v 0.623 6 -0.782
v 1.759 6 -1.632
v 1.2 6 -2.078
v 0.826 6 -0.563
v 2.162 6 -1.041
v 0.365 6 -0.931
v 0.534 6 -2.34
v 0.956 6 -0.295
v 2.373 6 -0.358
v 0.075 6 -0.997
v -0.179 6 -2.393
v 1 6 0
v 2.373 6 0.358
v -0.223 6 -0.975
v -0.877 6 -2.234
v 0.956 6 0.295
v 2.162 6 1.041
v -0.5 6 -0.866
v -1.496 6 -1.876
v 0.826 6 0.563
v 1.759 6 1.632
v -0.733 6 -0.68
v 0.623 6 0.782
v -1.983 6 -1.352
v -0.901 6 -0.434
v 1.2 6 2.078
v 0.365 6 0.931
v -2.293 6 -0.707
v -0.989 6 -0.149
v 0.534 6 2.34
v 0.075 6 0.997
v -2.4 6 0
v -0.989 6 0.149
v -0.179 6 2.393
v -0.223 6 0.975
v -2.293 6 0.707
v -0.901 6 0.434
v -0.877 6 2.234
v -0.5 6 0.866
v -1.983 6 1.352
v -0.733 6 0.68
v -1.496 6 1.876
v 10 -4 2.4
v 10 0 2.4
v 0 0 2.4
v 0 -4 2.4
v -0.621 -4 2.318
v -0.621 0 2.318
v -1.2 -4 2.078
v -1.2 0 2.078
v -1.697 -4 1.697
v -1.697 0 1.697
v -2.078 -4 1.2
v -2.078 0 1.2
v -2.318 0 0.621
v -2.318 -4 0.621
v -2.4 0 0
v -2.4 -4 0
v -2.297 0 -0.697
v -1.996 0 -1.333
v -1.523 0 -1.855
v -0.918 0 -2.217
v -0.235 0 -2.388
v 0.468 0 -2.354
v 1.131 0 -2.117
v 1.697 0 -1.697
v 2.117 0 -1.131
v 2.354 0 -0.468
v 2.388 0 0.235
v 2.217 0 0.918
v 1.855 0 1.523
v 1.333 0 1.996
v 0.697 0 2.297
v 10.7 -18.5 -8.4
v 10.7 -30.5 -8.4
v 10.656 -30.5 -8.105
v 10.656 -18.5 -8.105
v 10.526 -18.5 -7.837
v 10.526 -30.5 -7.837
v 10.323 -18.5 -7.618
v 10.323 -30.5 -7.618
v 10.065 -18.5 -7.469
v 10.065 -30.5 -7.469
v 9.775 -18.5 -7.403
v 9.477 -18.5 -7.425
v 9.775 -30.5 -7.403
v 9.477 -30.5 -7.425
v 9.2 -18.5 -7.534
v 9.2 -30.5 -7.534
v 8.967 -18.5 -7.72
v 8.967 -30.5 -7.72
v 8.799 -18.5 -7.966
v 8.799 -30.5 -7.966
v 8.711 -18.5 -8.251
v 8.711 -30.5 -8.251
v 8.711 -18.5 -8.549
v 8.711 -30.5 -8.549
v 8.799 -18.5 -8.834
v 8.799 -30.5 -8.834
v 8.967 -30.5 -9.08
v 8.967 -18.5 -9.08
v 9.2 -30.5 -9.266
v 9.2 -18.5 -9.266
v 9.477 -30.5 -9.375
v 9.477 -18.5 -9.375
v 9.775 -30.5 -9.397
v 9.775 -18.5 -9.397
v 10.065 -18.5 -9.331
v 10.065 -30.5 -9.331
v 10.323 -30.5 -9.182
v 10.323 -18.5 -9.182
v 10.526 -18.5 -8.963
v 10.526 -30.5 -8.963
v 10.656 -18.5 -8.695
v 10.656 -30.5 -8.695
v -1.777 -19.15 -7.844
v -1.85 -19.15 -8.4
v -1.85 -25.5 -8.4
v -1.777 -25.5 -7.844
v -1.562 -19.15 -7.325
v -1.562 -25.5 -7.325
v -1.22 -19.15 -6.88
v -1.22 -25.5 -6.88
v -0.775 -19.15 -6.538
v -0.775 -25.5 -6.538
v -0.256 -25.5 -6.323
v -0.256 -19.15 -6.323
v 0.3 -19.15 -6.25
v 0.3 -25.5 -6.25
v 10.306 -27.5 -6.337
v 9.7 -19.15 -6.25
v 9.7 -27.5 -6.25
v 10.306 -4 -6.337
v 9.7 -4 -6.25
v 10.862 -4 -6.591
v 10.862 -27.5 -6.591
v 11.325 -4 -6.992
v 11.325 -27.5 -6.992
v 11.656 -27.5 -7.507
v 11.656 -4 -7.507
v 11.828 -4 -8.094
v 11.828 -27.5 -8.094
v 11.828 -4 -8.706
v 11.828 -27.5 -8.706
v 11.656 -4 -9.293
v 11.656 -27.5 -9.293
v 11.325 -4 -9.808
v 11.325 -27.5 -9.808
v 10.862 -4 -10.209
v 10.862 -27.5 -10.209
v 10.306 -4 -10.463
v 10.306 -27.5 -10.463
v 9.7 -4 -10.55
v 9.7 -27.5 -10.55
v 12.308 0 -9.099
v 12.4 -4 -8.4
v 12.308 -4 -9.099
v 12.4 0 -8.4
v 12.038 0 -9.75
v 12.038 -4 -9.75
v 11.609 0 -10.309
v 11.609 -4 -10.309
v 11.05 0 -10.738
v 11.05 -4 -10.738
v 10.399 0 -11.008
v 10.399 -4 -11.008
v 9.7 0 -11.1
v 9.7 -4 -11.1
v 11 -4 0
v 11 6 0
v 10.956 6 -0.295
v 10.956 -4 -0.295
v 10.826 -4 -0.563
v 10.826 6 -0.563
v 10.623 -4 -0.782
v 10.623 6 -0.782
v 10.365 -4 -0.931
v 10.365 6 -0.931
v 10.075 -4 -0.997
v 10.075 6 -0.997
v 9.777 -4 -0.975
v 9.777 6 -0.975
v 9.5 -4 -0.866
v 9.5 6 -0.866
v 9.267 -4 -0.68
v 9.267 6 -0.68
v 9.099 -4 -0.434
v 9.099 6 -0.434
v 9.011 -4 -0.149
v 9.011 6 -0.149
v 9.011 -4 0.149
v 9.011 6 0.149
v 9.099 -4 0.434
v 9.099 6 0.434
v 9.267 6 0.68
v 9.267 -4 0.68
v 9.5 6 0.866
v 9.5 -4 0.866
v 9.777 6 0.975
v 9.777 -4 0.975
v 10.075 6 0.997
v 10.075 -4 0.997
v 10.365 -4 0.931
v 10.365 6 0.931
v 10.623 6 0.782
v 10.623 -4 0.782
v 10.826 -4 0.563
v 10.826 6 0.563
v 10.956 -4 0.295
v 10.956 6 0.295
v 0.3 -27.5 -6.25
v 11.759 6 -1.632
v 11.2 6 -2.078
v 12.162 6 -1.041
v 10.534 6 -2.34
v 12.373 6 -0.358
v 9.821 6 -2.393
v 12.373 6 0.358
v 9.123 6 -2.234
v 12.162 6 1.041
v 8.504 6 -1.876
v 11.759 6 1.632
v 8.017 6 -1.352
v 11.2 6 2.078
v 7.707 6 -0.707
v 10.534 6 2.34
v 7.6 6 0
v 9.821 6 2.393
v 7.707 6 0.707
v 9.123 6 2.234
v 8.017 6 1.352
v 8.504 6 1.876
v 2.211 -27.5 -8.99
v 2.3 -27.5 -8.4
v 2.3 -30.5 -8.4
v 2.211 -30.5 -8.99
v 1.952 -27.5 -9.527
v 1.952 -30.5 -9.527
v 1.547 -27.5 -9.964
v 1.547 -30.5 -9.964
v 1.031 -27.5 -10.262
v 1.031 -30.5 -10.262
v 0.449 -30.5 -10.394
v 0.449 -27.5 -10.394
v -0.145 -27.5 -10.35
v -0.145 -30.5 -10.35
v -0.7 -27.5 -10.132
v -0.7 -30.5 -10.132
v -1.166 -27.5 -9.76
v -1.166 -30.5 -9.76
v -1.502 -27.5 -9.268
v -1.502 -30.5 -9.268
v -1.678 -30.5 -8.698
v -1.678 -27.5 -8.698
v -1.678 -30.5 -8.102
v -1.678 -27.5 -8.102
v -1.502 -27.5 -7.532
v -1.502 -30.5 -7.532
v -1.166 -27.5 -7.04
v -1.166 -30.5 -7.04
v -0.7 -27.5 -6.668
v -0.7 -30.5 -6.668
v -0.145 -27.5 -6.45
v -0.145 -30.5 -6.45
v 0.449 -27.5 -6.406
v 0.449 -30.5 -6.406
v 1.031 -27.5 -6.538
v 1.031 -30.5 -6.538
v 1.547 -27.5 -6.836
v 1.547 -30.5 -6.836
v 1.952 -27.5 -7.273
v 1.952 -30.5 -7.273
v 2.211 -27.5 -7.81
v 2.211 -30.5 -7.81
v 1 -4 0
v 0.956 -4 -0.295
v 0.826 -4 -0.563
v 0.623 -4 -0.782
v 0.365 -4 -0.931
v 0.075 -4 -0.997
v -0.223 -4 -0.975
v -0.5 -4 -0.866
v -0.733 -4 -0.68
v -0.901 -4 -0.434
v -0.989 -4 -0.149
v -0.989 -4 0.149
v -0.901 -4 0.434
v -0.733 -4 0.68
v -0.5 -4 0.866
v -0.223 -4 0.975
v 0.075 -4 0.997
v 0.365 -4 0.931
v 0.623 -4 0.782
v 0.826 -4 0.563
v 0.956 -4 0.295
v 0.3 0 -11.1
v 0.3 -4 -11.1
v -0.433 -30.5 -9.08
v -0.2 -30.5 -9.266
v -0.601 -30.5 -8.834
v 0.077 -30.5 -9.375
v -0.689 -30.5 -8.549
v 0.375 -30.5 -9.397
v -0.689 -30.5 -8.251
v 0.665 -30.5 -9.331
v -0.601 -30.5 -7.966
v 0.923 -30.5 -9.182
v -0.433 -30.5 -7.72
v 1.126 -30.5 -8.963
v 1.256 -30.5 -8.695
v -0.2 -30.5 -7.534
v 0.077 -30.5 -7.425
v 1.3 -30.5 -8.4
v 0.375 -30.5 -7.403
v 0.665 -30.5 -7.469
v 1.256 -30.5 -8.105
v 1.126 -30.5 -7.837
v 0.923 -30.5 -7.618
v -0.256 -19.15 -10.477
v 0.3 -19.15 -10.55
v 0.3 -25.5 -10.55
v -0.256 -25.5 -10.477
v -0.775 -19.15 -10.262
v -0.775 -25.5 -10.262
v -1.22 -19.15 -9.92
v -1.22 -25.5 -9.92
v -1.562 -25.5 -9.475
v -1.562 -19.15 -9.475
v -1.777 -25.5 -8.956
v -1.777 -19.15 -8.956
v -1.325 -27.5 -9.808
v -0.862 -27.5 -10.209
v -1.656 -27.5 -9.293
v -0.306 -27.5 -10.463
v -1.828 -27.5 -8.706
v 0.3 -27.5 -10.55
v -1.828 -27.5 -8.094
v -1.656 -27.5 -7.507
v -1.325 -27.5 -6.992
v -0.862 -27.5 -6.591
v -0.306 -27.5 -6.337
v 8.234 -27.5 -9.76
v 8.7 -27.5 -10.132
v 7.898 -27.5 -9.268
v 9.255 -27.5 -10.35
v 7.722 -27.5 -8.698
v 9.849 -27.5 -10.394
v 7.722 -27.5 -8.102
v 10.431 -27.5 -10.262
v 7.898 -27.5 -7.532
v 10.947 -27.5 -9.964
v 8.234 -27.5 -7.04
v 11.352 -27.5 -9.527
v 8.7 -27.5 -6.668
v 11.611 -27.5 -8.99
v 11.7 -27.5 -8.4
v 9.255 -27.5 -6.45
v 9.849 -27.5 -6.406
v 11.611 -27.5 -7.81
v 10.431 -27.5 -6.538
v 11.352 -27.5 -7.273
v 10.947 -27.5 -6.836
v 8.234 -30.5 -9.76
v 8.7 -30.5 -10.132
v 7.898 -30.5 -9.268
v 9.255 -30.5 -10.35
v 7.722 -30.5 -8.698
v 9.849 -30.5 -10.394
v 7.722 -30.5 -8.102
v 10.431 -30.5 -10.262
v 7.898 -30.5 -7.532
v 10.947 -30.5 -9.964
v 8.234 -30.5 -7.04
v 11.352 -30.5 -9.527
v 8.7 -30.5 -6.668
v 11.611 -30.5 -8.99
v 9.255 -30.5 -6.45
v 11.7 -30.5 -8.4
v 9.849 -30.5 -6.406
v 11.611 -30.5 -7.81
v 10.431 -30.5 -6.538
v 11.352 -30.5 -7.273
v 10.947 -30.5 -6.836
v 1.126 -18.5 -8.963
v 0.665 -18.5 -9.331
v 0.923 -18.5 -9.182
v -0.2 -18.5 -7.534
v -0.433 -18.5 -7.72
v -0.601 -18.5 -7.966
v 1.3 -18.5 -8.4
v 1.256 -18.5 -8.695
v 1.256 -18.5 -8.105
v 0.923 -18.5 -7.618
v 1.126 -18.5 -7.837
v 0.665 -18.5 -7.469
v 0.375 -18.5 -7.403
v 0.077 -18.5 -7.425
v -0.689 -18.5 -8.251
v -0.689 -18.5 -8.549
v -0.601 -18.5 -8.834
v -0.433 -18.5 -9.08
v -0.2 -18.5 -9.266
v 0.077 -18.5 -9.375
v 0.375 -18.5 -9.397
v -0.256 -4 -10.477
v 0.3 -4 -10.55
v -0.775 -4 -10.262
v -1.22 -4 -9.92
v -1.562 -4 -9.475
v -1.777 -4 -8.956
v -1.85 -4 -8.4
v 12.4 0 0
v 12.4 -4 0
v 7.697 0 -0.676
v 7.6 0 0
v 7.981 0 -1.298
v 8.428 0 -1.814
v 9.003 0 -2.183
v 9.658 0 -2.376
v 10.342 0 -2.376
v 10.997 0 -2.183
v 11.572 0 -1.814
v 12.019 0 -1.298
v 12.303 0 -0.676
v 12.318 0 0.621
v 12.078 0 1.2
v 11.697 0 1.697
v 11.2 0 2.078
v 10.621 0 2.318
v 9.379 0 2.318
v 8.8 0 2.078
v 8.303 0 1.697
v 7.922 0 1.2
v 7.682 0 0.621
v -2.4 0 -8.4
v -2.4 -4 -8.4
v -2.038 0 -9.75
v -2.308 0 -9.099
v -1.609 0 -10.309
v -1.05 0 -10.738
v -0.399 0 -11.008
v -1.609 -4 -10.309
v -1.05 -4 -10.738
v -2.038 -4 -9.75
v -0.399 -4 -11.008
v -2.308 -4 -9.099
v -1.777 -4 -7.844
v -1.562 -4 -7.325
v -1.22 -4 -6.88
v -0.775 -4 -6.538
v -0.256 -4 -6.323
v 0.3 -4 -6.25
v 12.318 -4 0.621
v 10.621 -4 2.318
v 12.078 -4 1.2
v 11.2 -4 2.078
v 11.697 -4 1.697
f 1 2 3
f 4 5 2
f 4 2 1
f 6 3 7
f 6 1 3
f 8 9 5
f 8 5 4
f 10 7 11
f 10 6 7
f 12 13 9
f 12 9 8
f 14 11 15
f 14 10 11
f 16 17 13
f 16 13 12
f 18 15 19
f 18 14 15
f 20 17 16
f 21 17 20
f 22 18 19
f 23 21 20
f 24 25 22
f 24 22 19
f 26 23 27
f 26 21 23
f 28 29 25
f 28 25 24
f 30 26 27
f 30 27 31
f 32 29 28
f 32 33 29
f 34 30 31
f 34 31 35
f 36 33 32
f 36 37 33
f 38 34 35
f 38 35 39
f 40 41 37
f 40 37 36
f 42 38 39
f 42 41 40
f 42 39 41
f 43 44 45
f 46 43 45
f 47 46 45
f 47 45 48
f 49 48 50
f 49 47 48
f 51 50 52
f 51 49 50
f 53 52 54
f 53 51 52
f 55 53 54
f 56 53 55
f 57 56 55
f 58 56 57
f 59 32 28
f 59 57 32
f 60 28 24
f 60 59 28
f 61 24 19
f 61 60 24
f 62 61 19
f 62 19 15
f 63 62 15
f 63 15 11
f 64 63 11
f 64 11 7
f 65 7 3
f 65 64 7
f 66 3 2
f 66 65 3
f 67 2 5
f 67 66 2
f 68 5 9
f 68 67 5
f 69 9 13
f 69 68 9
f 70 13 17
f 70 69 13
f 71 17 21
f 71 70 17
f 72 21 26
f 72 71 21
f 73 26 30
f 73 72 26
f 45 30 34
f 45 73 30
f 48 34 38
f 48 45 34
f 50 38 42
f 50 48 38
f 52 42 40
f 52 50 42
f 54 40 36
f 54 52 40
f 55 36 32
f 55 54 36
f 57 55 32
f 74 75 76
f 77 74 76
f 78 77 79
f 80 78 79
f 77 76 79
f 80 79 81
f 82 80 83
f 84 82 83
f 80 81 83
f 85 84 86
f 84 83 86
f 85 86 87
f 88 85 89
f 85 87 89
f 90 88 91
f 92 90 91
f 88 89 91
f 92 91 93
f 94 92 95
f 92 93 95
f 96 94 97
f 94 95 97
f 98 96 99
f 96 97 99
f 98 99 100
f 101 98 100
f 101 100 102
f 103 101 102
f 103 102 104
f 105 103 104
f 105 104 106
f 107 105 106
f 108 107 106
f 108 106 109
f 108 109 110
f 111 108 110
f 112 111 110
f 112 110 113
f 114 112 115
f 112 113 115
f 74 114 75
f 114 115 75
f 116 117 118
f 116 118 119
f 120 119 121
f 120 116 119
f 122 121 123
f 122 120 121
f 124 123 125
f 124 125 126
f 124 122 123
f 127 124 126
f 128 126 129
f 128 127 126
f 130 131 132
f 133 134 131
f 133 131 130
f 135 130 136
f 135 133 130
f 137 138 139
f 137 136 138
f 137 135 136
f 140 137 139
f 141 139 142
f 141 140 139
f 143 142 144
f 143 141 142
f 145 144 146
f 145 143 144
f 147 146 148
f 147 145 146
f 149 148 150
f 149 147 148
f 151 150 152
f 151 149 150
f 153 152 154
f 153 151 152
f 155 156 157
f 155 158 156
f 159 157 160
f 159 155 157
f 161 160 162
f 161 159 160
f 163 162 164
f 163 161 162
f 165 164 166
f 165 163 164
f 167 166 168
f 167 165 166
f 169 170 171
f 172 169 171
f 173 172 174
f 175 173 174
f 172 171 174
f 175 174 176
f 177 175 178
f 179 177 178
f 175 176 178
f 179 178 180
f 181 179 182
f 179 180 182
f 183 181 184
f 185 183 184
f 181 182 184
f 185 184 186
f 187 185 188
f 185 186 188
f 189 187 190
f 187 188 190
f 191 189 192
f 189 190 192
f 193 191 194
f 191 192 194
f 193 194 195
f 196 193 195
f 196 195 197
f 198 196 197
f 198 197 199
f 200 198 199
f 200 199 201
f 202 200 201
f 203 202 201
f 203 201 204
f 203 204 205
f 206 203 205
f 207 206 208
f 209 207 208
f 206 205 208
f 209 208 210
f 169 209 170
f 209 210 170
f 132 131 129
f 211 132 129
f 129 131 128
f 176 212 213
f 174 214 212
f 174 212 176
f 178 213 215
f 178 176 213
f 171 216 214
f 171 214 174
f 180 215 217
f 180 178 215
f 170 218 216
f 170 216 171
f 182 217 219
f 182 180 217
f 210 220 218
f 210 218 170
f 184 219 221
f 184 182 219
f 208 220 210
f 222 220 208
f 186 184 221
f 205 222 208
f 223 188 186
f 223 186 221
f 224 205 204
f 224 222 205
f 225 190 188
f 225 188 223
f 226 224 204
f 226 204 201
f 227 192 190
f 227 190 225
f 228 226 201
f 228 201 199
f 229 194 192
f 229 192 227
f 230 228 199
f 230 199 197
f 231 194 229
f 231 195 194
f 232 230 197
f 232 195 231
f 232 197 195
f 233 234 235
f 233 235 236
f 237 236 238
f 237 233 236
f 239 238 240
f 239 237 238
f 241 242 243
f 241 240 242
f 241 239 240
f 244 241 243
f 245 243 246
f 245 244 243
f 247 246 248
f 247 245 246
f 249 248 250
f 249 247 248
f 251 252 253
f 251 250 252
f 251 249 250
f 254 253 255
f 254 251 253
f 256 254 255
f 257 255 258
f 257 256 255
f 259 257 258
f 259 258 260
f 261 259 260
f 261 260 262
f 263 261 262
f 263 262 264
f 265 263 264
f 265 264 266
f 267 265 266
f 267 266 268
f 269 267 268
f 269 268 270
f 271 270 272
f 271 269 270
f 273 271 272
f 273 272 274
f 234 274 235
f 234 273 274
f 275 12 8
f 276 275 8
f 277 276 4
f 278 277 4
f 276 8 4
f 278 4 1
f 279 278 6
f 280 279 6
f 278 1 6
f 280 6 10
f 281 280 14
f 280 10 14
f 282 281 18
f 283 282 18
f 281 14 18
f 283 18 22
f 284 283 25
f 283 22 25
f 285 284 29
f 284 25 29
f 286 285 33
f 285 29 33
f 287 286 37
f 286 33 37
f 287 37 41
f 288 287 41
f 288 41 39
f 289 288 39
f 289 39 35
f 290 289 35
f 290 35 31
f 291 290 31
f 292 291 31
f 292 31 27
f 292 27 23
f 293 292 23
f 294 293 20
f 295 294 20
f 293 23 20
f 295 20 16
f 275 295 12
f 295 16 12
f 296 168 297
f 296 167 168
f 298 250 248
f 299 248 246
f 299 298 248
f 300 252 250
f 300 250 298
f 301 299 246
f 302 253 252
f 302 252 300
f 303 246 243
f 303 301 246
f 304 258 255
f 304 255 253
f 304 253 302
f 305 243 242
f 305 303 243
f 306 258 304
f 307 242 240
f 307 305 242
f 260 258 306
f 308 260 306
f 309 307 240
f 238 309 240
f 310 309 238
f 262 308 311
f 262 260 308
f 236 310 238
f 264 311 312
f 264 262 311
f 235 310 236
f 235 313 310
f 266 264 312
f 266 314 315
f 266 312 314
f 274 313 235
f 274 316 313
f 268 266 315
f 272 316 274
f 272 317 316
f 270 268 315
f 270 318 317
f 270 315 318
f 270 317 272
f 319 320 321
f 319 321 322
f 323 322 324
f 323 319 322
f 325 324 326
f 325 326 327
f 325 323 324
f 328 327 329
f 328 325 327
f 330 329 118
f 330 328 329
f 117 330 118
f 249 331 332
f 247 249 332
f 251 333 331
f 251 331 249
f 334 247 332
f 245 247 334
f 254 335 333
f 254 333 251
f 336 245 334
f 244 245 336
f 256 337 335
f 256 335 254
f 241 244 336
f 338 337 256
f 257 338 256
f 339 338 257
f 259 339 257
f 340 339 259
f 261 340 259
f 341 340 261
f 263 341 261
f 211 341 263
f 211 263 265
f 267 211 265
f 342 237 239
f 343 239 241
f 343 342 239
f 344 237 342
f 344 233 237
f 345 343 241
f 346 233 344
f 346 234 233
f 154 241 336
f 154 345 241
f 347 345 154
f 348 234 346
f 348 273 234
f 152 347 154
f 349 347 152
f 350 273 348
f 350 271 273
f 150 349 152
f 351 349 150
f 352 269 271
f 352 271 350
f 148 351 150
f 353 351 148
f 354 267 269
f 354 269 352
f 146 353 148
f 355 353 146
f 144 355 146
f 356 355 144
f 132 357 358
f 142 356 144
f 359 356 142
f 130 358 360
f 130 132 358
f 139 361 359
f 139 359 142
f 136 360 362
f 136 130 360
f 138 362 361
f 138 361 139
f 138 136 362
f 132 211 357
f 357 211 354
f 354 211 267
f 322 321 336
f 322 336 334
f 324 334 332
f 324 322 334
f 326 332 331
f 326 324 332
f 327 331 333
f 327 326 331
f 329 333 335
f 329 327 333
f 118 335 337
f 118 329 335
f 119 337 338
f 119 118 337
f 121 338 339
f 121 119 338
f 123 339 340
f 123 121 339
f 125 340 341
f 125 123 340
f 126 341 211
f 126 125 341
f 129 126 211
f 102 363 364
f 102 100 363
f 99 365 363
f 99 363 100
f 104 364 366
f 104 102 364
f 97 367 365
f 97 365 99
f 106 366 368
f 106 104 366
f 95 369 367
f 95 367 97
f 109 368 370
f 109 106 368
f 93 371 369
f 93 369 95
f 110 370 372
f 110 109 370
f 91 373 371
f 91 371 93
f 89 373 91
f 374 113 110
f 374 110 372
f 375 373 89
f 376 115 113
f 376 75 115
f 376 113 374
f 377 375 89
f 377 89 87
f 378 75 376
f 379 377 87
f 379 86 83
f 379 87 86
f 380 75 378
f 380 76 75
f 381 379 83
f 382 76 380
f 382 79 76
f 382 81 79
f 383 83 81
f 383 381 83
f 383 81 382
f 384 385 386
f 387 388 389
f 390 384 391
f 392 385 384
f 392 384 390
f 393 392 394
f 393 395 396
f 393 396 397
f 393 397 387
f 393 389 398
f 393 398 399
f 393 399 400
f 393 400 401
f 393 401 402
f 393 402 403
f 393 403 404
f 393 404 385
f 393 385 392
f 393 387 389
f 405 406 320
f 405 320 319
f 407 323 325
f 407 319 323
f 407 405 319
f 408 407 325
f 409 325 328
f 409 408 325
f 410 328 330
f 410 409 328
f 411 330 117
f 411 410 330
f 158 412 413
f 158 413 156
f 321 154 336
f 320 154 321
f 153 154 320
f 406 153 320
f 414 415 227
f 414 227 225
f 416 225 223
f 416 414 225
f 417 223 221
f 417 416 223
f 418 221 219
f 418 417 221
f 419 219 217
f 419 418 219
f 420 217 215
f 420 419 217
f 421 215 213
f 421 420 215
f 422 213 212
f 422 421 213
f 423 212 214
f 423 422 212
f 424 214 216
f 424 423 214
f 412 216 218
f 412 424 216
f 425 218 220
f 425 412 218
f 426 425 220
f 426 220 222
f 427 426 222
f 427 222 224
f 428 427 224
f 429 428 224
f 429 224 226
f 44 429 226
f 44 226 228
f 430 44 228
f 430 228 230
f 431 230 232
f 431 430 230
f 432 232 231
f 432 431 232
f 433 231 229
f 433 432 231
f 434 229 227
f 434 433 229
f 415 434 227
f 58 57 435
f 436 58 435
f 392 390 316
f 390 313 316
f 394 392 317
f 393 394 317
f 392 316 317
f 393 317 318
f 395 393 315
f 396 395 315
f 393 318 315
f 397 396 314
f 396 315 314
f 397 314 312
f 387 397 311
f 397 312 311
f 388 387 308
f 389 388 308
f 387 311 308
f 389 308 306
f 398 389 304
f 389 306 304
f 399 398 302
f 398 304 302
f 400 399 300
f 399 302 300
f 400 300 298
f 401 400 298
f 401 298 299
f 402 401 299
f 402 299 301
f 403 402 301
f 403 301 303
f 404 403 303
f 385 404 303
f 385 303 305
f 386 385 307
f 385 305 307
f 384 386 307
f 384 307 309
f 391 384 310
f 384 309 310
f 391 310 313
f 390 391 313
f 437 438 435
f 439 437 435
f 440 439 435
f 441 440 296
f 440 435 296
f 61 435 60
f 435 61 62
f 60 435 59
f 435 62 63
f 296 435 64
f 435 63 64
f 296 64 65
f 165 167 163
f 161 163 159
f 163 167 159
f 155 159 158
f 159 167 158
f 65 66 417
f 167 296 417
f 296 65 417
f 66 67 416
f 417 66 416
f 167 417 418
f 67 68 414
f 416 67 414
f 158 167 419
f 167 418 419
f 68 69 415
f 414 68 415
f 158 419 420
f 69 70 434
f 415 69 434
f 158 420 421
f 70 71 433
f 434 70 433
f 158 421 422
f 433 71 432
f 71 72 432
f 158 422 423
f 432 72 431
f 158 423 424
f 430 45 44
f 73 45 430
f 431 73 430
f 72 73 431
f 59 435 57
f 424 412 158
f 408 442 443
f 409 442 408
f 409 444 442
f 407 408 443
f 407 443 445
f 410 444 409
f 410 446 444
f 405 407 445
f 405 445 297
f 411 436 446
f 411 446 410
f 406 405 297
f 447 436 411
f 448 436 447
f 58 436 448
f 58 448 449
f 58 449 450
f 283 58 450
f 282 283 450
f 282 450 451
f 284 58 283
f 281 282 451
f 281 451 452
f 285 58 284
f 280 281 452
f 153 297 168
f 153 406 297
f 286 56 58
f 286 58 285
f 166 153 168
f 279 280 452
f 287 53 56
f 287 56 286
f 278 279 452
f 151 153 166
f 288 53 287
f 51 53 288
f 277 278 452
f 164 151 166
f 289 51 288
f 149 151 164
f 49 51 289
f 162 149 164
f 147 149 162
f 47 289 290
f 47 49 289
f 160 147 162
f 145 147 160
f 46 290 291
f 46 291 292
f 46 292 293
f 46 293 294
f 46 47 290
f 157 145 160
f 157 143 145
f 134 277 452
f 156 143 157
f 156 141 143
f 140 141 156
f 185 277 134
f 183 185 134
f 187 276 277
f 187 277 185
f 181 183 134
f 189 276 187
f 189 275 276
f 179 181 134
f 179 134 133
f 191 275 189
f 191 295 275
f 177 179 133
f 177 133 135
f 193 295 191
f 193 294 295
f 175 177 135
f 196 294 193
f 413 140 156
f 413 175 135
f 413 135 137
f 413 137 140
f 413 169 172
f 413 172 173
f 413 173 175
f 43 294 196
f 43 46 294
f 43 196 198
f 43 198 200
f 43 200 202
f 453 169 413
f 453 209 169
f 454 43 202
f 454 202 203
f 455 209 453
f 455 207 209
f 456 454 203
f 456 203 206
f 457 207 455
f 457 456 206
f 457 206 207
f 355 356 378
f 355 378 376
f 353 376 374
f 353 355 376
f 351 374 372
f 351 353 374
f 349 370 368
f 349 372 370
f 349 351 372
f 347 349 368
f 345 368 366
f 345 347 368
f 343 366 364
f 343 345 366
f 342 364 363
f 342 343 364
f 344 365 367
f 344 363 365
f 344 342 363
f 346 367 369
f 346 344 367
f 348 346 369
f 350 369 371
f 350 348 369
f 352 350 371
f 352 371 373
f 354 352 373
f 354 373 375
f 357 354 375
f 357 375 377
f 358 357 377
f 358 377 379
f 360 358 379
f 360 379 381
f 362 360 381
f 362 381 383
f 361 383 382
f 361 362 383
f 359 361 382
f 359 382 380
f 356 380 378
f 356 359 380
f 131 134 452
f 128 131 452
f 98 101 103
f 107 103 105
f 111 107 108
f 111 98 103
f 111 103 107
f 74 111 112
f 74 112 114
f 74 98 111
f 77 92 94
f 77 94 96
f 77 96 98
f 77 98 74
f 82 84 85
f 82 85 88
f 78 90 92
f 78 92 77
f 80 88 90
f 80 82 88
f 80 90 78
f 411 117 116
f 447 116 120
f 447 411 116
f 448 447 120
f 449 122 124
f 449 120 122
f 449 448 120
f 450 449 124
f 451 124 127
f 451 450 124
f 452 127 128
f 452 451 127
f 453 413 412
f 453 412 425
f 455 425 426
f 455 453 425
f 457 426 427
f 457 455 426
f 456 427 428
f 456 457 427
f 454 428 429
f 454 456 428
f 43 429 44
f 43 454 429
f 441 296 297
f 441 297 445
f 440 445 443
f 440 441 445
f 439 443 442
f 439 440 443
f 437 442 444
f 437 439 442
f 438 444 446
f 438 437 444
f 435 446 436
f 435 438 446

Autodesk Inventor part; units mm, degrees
ref_plane "YZ Plane" through (0, 0, 0) normal (1, 0, 0) x (0, 1, 0)
ref_plane "XZ Plane" through (0, 0, 0) normal (0, 1, 0) x (-1, 0, 0)
ref_plane "XY Plane" through (0, 0, 0) normal (0, 0, 1) x (1, 0, 0)
sketch "Sketch1" plane through (0, 0, 0) normal (0, 1, 0) x (-1, 0, 0)
  circle A0 centre (0, 0) radius 2.4
  circle A1 centre (-0.3, -8.4) radius 2.15
  circle A2 centre (-10, 0) radius 2.4
  circle A3 centre (-9.7, -8.4) radius 2.15
  dimension "d0" = 4.8
  dimension "d1" = 4.3
  dimension "d3" = 4.8
  dimension "d4" = 10
  dimension "d5" = 4.3
  dimension "d33" = 0.3
  dimension "d34" = 0.3
extrude "Extrusion1" add sketch "Sketch1" along normal blind 6 contours A0 | A2
sketch "Sketch3" plane through (0, 0, 0) normal (0, -1, 0) x (1, 0, 0)
  circle A0 centre (10, 0) radius 2.4 projected
  line L0 (10, 2.4) -> (0, 2.4)
  line L1 (12.4, 0) -> (12.4, -8.4)
  circle A1 centre (0, 0) radius 2.4 projected
  line L2 (-2.4, 0) -> (-2.4, -8.4)
  circle A2 centre (9.7, -8.4) radius 2.15 projected
  circle A3 centre (0.3, -8.4) radius 2.15 projected
  circle A4 centre (0.3, -8.4) radius 2.7
  circle A5 centre (9.7, -8.4) radius 2.7
  line L3 (9.7, -11.1) -> (0.3, -11.1)
  dimension "d12" = 8.4
  dimension "d13" = 8.4
extrude "Extrusion3" add sketch "Sketch3" along normal blind 4 contours A0 | L1 A5 L3 A4 L2 A1 L0 A0 | A5 | A1 | A4 | A2 | A3
extrude "Extrusion4" add sketch "Sketch1" against normal blind 25.5 contours A1 | A3
sketch "Sketch4" plane through (0, -4, 0) normal (0, -1, 0) x (1, 0, 0)
  circle A0 centre (9.7, -8.4) radius 2.15 projected
  line L0 (9.7, -6.25) -> (-0.3, -6.25)
  line L1 (9.7, -10.55) -> (0.3, -10.55)
  circle A1 centre (0.3, -8.4) radius 2.15 projected
  point P0 (0, 0)
  point P1 (0.3, -6.25)
extrude "Extrusion5" add sketch "Sketch4" along normal blind 15.15 contours A0 L1 A1 L0
sketch "Sketch6" plane through (0.3, -25.5, -8.4) normal (0, -1, 0) x (1, 0, 0)
  circle A0 centre (0, 0) radius 1.5 projected
  point P0 (-0.3, 8.4)
  point P1 (-5.35, -0.0027)
  dimension "d24" = 5.35
sketch "Sketch7" plane through (9.7, -25.5, -8.4) normal (0, -1, 0) x (1, 0, 0)
  circle A0 centre (0, 0) radius 2.15 projected
  circle A1 centre (0, 0) radius 2
  arc A2 (-9.4, 2.15) -> (-9.4, -2.15) centre (-9.4, 0) ccw projected
  circle A3 centre (-9.4, 0) radius 2
  point P0 (-9.7, 8.4)
  dimension "d25" = 4
  dimension "d26" = 4
extrude "Extrusion7" add sketch "Sketch7" along normal blind 2 contours A1 | A3
sketch "Sketch8" plane through (0.3, -27.5, -8.4) normal (0, -1, 0) x (1, 0, 0)
  circle A0 centre (0, 0) radius 1.5
  circle A1 centre (9.4, 0) radius 2 projected
  circle A2 centre (9.4, 0) radius 1.5
  point P0 (-0.3, 8.4)
  dimension "d29" = 3
  dimension "d30" = 3
extrude "Extrusion8" cut sketch "Sketch8" against normal blind 6 contours A0 | A2
sketch "Sketch10" plane through (0, -19.15, 0) normal (0, -1, 0) x (1, 0, 0)
  circle A0 centre (0.3, -8.4) radius 2 projected
  line L0 (0.3, -10.55) -> (9.7, -10.55) projected
  arc A1 (9.7, -6.25) -> (9.7, -10.55) centre (9.7, -8.4) ccw projected
  line L1 (9.7, -6.25) -> (0.3, -6.25) projected
  arc A2 (0.3, -10.55) -> (0.3, -6.25) centre (0.3, -8.4) ccw projected
  circle A3 centre (0.3, -8.4) radius 2.15 projected
  circle A4 centre (9.7, -8.4) radius 2.15 projected
  circle A5 centre (9.7, -8.4) radius 2 projected
  point P0 (0, 0)
extrude "Extrusion9" add sketch "Sketch10" along normal up to surface (8.35 mm away) contours A0 | A2 L1 A1 L0 | A3 A2 | A1 A4 | A5
sketch "Sketch11" plane through (9.7, -27.5, -8.4) normal (0, -1, 0) x (1, 0, 0)
  arc A0 (-9.4, 2.15) -> (-9.4, -2.15) centre (-9.4, 0) ccw projected
  circle A1 centre (-9.4, 0) radius 2
  arc A2 (0, -2.15) -> (0, 2.15) centre (0, 0) ccw projected
  circle A3 centre (0, 0) radius 2
  point P0 (-9.7, 8.4)
  dimension "d37" = 4
  dimension "d38" = 4
extrude "Extrusion10" add sketch "Sketch11" along normal blind 3
sketch "Sketch12" plane through (0.3, -30.5, -8.4) normal (0, -1, 0) x (1, 0, 0)
  circle A0 centre (0, 0) radius 2 projected
  circle A1 centre (9.4, 0) radius 2 projected
  circle A2 centre (0, 0) radius 1
  circle A3 centre (9.4, 0) radius 1
  point P0 (-0.3, 8.4)
  dimension "d41" = 2
  dimension "d42" = 2
extrude "Extrusion11" cut sketch "Sketch12" against normal blind 12 contours A2 | A3
sketch "Sketch13" plane through (10, 6, 0) normal (0, 1, 0) x (1, 0, 0)
  circle A0 centre (0, 0) radius 2.4 projected
  circle A1 centre (-10, 0) radius 2.4 projected
  circle A2 centre (0, 0) radius 1
  circle A3 centre (-10, 0) radius 1
  dimension "d45" = 2
  dimension "d46" = 2
extrude "Extrusion12" cut sketch "Sketch13" against normal blind 12 contours A2 | A3
properties part number "gripper3leftsideservobracket_3DPrint"
